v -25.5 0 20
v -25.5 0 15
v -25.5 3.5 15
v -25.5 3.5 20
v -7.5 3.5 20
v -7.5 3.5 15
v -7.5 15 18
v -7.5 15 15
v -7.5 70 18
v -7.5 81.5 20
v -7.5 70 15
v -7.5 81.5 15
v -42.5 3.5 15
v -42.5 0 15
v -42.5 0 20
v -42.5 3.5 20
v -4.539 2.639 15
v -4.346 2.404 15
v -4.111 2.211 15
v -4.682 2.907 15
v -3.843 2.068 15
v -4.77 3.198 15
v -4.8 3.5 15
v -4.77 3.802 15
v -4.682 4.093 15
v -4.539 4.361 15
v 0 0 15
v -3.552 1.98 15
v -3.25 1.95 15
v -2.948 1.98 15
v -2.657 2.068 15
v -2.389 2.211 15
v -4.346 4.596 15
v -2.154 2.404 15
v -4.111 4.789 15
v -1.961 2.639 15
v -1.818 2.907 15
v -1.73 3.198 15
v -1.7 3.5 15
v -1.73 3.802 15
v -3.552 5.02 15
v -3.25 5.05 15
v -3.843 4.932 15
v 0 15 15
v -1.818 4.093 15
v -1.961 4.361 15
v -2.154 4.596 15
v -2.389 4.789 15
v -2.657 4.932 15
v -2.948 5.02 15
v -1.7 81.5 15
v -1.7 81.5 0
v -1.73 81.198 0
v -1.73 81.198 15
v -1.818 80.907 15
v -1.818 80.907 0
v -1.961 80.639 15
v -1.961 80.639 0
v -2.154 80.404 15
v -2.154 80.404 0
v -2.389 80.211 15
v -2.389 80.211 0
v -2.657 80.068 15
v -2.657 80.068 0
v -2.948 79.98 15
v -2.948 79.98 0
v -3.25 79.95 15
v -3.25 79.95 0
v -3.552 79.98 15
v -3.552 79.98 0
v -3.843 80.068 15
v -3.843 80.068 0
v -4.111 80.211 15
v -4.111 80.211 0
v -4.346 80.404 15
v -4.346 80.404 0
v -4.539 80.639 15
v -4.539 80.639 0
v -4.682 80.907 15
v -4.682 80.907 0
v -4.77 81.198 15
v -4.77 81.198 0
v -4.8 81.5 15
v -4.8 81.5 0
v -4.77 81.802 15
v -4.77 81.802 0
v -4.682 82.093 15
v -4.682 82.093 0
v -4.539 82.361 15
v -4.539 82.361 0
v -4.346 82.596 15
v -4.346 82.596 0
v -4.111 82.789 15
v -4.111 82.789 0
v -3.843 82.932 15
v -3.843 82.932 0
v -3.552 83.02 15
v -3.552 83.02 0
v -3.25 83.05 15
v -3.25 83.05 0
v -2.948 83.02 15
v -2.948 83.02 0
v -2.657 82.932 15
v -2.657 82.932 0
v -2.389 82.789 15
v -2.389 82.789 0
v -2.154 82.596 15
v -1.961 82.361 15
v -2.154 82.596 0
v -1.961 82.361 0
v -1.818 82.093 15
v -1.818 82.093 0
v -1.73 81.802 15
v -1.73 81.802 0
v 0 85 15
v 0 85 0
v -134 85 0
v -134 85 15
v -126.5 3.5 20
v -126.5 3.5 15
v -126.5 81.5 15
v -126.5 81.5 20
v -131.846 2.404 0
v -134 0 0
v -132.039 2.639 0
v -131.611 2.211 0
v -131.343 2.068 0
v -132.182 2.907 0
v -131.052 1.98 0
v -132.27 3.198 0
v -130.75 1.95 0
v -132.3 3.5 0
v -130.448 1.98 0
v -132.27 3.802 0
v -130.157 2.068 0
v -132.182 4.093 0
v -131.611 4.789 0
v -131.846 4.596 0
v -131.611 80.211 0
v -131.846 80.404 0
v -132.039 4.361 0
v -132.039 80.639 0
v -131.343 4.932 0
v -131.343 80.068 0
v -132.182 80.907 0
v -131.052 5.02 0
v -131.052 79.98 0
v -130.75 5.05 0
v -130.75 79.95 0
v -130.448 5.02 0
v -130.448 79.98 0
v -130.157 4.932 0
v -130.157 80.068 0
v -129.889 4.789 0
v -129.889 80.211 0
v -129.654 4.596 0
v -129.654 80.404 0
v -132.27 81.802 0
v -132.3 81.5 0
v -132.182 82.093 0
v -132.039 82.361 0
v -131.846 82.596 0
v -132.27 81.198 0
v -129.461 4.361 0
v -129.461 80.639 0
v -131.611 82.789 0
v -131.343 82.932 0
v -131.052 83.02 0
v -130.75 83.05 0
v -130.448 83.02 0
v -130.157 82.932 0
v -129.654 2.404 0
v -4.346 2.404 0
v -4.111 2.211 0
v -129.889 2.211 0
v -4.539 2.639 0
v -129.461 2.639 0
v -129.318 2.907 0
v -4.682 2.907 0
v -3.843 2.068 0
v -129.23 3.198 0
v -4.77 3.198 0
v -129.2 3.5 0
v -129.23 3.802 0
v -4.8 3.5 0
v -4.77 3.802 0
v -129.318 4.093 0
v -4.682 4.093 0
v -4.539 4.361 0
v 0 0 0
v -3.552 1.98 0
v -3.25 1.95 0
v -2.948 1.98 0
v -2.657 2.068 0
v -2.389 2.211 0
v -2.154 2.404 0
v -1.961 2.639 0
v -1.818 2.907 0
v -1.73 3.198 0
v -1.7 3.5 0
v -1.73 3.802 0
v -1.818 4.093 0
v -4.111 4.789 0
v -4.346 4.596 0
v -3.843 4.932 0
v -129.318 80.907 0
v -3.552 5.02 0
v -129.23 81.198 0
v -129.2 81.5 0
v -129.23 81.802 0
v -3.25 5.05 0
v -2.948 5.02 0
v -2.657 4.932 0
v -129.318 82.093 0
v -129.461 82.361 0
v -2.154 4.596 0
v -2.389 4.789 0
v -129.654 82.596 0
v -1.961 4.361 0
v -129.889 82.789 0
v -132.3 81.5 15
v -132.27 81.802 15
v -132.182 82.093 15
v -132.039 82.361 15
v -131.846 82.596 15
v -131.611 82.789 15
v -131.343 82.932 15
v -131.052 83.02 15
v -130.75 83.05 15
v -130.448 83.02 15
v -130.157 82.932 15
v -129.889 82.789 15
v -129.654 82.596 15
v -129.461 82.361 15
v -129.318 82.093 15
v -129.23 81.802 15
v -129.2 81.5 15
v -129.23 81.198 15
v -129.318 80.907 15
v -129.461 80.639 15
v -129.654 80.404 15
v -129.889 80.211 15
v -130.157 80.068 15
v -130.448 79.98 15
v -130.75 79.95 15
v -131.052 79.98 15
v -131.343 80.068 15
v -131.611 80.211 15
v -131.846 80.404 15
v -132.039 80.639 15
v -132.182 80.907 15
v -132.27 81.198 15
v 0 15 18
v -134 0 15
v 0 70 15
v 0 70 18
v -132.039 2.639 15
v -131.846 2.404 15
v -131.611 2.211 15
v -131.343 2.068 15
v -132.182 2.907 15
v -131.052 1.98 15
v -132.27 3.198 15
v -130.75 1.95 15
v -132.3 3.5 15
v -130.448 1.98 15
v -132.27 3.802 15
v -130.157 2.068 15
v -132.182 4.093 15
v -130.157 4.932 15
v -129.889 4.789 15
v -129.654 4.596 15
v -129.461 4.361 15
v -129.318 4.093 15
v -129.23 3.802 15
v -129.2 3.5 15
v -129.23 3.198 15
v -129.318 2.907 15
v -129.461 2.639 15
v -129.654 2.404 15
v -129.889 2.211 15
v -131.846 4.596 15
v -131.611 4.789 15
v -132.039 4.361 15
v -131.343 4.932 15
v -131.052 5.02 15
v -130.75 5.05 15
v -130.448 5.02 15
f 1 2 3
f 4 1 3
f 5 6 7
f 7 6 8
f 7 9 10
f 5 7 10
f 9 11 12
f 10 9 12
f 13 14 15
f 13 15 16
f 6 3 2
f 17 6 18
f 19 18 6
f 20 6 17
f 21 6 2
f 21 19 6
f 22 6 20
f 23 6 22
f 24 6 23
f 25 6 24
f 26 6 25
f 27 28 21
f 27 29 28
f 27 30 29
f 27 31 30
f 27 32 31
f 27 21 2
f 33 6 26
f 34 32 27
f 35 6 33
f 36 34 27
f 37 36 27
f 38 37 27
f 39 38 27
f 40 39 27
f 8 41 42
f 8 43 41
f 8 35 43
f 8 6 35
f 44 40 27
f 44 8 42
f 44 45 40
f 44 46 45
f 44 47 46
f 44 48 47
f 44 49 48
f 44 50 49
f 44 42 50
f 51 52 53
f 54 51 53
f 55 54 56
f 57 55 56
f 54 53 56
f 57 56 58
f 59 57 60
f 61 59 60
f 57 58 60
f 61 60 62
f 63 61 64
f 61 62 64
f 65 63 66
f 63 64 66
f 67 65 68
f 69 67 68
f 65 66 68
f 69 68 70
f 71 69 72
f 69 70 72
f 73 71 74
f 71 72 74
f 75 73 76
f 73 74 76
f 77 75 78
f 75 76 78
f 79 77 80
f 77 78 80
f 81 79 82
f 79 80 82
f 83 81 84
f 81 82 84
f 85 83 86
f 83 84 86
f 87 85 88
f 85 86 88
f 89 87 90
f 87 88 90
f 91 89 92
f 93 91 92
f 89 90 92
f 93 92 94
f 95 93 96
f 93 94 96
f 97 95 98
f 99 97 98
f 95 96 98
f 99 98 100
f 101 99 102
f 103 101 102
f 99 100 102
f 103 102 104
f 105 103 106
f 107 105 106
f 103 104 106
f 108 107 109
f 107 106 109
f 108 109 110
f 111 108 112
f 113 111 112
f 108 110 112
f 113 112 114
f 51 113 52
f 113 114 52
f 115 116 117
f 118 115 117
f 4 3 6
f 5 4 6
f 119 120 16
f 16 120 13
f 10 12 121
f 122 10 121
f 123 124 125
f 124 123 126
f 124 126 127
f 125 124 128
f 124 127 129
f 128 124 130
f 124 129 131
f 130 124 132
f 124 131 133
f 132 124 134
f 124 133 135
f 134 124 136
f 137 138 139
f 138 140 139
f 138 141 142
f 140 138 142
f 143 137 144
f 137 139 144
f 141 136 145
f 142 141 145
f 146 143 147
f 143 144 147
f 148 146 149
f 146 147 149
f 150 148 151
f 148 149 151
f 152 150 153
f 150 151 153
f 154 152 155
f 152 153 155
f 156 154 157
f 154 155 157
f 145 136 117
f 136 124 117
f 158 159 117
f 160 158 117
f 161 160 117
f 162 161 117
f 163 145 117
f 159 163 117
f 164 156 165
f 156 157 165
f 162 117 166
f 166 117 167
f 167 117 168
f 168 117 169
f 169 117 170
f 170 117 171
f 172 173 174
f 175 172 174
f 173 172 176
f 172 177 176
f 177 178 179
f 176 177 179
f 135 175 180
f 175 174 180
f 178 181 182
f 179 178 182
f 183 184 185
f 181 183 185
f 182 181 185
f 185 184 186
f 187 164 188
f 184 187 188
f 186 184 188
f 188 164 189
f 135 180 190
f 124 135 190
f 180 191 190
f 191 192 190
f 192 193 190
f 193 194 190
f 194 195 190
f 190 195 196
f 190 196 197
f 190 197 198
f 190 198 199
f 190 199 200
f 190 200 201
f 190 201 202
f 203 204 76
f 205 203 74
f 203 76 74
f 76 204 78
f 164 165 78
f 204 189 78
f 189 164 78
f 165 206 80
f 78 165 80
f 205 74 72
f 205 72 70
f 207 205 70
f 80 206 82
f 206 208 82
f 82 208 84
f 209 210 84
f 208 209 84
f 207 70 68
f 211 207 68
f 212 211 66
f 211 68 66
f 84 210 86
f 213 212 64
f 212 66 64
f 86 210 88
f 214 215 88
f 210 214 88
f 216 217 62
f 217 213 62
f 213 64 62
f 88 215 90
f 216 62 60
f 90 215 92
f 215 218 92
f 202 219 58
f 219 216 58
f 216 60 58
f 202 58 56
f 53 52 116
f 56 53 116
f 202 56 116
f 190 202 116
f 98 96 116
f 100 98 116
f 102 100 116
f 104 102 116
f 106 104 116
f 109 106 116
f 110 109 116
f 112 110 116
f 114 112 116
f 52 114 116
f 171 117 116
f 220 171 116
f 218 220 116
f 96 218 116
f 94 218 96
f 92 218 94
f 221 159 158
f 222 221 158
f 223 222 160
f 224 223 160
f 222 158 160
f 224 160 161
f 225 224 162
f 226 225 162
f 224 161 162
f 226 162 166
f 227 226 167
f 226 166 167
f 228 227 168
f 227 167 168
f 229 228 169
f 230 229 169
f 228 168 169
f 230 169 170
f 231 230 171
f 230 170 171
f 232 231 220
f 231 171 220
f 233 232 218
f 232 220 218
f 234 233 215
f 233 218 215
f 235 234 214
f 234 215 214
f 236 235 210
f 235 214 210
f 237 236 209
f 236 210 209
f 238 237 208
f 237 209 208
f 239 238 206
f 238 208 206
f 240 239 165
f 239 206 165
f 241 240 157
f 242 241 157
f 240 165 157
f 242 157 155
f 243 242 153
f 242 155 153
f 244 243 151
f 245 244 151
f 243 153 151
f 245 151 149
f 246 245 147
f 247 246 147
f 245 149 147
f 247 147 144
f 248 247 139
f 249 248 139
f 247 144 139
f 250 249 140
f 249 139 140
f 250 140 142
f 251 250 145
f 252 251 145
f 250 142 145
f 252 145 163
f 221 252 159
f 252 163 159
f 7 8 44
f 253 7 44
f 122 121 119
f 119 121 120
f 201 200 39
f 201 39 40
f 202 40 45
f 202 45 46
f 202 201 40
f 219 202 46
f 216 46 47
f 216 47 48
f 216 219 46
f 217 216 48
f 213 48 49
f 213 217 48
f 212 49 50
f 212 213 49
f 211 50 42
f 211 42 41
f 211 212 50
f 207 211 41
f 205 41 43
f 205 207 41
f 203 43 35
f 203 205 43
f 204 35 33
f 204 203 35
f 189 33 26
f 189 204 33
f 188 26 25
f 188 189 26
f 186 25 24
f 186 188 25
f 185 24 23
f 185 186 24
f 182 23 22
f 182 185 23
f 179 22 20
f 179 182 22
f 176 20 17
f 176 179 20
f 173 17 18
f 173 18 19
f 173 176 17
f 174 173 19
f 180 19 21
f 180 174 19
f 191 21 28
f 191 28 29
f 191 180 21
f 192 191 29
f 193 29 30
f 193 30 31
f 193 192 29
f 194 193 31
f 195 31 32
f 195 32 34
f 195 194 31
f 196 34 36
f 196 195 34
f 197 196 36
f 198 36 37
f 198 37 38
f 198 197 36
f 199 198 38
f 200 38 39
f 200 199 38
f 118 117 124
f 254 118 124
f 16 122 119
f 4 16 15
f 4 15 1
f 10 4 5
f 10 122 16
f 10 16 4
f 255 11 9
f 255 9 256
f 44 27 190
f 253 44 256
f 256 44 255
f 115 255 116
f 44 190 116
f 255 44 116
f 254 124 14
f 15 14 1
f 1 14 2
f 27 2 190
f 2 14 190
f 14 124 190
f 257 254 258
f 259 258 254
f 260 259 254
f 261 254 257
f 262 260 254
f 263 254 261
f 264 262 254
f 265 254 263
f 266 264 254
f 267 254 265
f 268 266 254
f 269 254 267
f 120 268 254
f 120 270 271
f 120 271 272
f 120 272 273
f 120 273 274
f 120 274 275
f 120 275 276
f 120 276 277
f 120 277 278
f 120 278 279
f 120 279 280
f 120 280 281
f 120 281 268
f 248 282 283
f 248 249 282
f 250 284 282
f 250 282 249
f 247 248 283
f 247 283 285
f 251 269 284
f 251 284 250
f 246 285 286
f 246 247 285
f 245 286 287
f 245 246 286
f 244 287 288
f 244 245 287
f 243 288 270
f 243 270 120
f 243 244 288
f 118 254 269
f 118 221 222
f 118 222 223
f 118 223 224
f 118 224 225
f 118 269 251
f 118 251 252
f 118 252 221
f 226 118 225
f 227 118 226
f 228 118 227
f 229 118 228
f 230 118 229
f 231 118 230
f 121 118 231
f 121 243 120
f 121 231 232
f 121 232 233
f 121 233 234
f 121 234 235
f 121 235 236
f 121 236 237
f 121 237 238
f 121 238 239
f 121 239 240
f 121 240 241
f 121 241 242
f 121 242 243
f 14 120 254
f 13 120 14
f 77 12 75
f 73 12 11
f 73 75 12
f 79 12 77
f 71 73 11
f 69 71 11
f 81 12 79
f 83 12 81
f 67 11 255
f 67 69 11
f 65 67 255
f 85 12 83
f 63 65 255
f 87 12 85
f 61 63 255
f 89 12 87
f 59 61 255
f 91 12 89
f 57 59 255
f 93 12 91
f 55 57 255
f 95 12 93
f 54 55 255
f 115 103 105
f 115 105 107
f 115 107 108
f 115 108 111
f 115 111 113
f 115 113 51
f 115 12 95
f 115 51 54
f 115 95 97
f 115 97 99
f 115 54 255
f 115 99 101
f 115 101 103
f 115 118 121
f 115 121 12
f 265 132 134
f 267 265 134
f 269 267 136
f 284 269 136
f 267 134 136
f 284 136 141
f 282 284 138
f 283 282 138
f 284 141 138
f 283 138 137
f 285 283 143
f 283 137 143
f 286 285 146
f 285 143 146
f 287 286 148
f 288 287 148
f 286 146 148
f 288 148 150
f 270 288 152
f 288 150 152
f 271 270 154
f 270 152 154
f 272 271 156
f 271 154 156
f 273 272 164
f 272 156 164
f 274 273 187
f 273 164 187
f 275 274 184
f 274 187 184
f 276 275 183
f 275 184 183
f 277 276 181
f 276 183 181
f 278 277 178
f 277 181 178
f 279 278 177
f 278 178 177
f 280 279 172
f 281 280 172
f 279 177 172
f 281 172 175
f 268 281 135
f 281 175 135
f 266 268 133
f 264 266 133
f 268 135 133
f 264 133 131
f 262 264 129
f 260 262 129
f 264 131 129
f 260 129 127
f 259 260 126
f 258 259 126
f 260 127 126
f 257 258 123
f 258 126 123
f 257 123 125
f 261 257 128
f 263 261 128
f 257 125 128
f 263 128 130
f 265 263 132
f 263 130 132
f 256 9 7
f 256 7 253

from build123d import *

# Parameters (mm, degrees)
F0_R     = 1.55
F1_DEPTH = 15
F2_W     = 17
F2_H     = 3.5
F3_DEPTH = 5
F4_W     = 7.5
F4_H     = 55
F5_DEPTH = 3


with BuildPart() as f1:
    # F0 (on Top) → F1 (new body)
    with BuildSketch(Plane.XY):
        with Locations((-3.25, 3.5)):
            Circle(F0_R)
        with BuildLine():
            ThreePointArc((-129.2, 81.5), (-130.75, 83.05), (-132.3, 81.5))
            ThreePointArc((-132.3, 81.5), (-130.75, 79.95), (-129.2, 81.5))
        make_face()
        with BuildLine():
            ThreePointArc((-129.2, 3.5), (-130.75, 5.05), (-132.3, 3.5))
            ThreePointArc((-132.3, 3.5), (-130.75, 1.95), (-129.2, 3.5))
        make_face()
        Polygon((-134, 0), (0, 0), (0, 3.5), (0, 81.5), (0, 85), (-134, 85), (-134, 81.5), (-134, 3.5), align=None)
        with BuildLine():
            ThreePointArc((-129.2, 3.5), (-130.75, 1.95), (-132.3, 3.5))
            ThreePointArc((-132.3, 3.5), (-130.75, 5.05), (-129.2, 3.5))
        make_face(mode=Mode.SUBTRACT)
        with Locations((-3.25, 3.5)):
            Circle(F0_R, mode=Mode.SUBTRACT)
        with BuildLine():
            ThreePointArc((-129.2, 81.5), (-130.75, 79.95), (-132.3, 81.5))
            ThreePointArc((-132.3, 81.5), (-130.75, 83.05), (-129.2, 81.5))
        make_face(mode=Mode.SUBTRACT)
        with BuildLine():
            ThreePointArc((-4.8, 81.5), (-3.25, 83.05), (-1.7, 81.5))
            ThreePointArc((-1.7, 81.5), (-3.25, 79.95), (-4.8, 81.5))
        make_face(mode=Mode.SUBTRACT)
    extrude(amount=F1_DEPTH)

    # F2 (on face) → F3 (join)
    with BuildSketch(Plane.XY.offset(15)):
        Polygon((-7.5, 3.5), (-7.5, 81.5), (-126.5, 81.5), (-126.5, 3.5), (-42.5, 3.5), (-25.5, 3.5), align=None)
        with Locations((-34, 1.75)):
            Rectangle(F2_W, F2_H)
    extrude(amount=F3_DEPTH)

    # F4 (on face) → F5 (join)
    with BuildSketch(Plane.XY.offset(15)):
        with Locations((-3.75, 42.5)):
            Rectangle(F4_W, F4_H)
    extrude(amount=F5_DEPTH)


solid = f1.part
